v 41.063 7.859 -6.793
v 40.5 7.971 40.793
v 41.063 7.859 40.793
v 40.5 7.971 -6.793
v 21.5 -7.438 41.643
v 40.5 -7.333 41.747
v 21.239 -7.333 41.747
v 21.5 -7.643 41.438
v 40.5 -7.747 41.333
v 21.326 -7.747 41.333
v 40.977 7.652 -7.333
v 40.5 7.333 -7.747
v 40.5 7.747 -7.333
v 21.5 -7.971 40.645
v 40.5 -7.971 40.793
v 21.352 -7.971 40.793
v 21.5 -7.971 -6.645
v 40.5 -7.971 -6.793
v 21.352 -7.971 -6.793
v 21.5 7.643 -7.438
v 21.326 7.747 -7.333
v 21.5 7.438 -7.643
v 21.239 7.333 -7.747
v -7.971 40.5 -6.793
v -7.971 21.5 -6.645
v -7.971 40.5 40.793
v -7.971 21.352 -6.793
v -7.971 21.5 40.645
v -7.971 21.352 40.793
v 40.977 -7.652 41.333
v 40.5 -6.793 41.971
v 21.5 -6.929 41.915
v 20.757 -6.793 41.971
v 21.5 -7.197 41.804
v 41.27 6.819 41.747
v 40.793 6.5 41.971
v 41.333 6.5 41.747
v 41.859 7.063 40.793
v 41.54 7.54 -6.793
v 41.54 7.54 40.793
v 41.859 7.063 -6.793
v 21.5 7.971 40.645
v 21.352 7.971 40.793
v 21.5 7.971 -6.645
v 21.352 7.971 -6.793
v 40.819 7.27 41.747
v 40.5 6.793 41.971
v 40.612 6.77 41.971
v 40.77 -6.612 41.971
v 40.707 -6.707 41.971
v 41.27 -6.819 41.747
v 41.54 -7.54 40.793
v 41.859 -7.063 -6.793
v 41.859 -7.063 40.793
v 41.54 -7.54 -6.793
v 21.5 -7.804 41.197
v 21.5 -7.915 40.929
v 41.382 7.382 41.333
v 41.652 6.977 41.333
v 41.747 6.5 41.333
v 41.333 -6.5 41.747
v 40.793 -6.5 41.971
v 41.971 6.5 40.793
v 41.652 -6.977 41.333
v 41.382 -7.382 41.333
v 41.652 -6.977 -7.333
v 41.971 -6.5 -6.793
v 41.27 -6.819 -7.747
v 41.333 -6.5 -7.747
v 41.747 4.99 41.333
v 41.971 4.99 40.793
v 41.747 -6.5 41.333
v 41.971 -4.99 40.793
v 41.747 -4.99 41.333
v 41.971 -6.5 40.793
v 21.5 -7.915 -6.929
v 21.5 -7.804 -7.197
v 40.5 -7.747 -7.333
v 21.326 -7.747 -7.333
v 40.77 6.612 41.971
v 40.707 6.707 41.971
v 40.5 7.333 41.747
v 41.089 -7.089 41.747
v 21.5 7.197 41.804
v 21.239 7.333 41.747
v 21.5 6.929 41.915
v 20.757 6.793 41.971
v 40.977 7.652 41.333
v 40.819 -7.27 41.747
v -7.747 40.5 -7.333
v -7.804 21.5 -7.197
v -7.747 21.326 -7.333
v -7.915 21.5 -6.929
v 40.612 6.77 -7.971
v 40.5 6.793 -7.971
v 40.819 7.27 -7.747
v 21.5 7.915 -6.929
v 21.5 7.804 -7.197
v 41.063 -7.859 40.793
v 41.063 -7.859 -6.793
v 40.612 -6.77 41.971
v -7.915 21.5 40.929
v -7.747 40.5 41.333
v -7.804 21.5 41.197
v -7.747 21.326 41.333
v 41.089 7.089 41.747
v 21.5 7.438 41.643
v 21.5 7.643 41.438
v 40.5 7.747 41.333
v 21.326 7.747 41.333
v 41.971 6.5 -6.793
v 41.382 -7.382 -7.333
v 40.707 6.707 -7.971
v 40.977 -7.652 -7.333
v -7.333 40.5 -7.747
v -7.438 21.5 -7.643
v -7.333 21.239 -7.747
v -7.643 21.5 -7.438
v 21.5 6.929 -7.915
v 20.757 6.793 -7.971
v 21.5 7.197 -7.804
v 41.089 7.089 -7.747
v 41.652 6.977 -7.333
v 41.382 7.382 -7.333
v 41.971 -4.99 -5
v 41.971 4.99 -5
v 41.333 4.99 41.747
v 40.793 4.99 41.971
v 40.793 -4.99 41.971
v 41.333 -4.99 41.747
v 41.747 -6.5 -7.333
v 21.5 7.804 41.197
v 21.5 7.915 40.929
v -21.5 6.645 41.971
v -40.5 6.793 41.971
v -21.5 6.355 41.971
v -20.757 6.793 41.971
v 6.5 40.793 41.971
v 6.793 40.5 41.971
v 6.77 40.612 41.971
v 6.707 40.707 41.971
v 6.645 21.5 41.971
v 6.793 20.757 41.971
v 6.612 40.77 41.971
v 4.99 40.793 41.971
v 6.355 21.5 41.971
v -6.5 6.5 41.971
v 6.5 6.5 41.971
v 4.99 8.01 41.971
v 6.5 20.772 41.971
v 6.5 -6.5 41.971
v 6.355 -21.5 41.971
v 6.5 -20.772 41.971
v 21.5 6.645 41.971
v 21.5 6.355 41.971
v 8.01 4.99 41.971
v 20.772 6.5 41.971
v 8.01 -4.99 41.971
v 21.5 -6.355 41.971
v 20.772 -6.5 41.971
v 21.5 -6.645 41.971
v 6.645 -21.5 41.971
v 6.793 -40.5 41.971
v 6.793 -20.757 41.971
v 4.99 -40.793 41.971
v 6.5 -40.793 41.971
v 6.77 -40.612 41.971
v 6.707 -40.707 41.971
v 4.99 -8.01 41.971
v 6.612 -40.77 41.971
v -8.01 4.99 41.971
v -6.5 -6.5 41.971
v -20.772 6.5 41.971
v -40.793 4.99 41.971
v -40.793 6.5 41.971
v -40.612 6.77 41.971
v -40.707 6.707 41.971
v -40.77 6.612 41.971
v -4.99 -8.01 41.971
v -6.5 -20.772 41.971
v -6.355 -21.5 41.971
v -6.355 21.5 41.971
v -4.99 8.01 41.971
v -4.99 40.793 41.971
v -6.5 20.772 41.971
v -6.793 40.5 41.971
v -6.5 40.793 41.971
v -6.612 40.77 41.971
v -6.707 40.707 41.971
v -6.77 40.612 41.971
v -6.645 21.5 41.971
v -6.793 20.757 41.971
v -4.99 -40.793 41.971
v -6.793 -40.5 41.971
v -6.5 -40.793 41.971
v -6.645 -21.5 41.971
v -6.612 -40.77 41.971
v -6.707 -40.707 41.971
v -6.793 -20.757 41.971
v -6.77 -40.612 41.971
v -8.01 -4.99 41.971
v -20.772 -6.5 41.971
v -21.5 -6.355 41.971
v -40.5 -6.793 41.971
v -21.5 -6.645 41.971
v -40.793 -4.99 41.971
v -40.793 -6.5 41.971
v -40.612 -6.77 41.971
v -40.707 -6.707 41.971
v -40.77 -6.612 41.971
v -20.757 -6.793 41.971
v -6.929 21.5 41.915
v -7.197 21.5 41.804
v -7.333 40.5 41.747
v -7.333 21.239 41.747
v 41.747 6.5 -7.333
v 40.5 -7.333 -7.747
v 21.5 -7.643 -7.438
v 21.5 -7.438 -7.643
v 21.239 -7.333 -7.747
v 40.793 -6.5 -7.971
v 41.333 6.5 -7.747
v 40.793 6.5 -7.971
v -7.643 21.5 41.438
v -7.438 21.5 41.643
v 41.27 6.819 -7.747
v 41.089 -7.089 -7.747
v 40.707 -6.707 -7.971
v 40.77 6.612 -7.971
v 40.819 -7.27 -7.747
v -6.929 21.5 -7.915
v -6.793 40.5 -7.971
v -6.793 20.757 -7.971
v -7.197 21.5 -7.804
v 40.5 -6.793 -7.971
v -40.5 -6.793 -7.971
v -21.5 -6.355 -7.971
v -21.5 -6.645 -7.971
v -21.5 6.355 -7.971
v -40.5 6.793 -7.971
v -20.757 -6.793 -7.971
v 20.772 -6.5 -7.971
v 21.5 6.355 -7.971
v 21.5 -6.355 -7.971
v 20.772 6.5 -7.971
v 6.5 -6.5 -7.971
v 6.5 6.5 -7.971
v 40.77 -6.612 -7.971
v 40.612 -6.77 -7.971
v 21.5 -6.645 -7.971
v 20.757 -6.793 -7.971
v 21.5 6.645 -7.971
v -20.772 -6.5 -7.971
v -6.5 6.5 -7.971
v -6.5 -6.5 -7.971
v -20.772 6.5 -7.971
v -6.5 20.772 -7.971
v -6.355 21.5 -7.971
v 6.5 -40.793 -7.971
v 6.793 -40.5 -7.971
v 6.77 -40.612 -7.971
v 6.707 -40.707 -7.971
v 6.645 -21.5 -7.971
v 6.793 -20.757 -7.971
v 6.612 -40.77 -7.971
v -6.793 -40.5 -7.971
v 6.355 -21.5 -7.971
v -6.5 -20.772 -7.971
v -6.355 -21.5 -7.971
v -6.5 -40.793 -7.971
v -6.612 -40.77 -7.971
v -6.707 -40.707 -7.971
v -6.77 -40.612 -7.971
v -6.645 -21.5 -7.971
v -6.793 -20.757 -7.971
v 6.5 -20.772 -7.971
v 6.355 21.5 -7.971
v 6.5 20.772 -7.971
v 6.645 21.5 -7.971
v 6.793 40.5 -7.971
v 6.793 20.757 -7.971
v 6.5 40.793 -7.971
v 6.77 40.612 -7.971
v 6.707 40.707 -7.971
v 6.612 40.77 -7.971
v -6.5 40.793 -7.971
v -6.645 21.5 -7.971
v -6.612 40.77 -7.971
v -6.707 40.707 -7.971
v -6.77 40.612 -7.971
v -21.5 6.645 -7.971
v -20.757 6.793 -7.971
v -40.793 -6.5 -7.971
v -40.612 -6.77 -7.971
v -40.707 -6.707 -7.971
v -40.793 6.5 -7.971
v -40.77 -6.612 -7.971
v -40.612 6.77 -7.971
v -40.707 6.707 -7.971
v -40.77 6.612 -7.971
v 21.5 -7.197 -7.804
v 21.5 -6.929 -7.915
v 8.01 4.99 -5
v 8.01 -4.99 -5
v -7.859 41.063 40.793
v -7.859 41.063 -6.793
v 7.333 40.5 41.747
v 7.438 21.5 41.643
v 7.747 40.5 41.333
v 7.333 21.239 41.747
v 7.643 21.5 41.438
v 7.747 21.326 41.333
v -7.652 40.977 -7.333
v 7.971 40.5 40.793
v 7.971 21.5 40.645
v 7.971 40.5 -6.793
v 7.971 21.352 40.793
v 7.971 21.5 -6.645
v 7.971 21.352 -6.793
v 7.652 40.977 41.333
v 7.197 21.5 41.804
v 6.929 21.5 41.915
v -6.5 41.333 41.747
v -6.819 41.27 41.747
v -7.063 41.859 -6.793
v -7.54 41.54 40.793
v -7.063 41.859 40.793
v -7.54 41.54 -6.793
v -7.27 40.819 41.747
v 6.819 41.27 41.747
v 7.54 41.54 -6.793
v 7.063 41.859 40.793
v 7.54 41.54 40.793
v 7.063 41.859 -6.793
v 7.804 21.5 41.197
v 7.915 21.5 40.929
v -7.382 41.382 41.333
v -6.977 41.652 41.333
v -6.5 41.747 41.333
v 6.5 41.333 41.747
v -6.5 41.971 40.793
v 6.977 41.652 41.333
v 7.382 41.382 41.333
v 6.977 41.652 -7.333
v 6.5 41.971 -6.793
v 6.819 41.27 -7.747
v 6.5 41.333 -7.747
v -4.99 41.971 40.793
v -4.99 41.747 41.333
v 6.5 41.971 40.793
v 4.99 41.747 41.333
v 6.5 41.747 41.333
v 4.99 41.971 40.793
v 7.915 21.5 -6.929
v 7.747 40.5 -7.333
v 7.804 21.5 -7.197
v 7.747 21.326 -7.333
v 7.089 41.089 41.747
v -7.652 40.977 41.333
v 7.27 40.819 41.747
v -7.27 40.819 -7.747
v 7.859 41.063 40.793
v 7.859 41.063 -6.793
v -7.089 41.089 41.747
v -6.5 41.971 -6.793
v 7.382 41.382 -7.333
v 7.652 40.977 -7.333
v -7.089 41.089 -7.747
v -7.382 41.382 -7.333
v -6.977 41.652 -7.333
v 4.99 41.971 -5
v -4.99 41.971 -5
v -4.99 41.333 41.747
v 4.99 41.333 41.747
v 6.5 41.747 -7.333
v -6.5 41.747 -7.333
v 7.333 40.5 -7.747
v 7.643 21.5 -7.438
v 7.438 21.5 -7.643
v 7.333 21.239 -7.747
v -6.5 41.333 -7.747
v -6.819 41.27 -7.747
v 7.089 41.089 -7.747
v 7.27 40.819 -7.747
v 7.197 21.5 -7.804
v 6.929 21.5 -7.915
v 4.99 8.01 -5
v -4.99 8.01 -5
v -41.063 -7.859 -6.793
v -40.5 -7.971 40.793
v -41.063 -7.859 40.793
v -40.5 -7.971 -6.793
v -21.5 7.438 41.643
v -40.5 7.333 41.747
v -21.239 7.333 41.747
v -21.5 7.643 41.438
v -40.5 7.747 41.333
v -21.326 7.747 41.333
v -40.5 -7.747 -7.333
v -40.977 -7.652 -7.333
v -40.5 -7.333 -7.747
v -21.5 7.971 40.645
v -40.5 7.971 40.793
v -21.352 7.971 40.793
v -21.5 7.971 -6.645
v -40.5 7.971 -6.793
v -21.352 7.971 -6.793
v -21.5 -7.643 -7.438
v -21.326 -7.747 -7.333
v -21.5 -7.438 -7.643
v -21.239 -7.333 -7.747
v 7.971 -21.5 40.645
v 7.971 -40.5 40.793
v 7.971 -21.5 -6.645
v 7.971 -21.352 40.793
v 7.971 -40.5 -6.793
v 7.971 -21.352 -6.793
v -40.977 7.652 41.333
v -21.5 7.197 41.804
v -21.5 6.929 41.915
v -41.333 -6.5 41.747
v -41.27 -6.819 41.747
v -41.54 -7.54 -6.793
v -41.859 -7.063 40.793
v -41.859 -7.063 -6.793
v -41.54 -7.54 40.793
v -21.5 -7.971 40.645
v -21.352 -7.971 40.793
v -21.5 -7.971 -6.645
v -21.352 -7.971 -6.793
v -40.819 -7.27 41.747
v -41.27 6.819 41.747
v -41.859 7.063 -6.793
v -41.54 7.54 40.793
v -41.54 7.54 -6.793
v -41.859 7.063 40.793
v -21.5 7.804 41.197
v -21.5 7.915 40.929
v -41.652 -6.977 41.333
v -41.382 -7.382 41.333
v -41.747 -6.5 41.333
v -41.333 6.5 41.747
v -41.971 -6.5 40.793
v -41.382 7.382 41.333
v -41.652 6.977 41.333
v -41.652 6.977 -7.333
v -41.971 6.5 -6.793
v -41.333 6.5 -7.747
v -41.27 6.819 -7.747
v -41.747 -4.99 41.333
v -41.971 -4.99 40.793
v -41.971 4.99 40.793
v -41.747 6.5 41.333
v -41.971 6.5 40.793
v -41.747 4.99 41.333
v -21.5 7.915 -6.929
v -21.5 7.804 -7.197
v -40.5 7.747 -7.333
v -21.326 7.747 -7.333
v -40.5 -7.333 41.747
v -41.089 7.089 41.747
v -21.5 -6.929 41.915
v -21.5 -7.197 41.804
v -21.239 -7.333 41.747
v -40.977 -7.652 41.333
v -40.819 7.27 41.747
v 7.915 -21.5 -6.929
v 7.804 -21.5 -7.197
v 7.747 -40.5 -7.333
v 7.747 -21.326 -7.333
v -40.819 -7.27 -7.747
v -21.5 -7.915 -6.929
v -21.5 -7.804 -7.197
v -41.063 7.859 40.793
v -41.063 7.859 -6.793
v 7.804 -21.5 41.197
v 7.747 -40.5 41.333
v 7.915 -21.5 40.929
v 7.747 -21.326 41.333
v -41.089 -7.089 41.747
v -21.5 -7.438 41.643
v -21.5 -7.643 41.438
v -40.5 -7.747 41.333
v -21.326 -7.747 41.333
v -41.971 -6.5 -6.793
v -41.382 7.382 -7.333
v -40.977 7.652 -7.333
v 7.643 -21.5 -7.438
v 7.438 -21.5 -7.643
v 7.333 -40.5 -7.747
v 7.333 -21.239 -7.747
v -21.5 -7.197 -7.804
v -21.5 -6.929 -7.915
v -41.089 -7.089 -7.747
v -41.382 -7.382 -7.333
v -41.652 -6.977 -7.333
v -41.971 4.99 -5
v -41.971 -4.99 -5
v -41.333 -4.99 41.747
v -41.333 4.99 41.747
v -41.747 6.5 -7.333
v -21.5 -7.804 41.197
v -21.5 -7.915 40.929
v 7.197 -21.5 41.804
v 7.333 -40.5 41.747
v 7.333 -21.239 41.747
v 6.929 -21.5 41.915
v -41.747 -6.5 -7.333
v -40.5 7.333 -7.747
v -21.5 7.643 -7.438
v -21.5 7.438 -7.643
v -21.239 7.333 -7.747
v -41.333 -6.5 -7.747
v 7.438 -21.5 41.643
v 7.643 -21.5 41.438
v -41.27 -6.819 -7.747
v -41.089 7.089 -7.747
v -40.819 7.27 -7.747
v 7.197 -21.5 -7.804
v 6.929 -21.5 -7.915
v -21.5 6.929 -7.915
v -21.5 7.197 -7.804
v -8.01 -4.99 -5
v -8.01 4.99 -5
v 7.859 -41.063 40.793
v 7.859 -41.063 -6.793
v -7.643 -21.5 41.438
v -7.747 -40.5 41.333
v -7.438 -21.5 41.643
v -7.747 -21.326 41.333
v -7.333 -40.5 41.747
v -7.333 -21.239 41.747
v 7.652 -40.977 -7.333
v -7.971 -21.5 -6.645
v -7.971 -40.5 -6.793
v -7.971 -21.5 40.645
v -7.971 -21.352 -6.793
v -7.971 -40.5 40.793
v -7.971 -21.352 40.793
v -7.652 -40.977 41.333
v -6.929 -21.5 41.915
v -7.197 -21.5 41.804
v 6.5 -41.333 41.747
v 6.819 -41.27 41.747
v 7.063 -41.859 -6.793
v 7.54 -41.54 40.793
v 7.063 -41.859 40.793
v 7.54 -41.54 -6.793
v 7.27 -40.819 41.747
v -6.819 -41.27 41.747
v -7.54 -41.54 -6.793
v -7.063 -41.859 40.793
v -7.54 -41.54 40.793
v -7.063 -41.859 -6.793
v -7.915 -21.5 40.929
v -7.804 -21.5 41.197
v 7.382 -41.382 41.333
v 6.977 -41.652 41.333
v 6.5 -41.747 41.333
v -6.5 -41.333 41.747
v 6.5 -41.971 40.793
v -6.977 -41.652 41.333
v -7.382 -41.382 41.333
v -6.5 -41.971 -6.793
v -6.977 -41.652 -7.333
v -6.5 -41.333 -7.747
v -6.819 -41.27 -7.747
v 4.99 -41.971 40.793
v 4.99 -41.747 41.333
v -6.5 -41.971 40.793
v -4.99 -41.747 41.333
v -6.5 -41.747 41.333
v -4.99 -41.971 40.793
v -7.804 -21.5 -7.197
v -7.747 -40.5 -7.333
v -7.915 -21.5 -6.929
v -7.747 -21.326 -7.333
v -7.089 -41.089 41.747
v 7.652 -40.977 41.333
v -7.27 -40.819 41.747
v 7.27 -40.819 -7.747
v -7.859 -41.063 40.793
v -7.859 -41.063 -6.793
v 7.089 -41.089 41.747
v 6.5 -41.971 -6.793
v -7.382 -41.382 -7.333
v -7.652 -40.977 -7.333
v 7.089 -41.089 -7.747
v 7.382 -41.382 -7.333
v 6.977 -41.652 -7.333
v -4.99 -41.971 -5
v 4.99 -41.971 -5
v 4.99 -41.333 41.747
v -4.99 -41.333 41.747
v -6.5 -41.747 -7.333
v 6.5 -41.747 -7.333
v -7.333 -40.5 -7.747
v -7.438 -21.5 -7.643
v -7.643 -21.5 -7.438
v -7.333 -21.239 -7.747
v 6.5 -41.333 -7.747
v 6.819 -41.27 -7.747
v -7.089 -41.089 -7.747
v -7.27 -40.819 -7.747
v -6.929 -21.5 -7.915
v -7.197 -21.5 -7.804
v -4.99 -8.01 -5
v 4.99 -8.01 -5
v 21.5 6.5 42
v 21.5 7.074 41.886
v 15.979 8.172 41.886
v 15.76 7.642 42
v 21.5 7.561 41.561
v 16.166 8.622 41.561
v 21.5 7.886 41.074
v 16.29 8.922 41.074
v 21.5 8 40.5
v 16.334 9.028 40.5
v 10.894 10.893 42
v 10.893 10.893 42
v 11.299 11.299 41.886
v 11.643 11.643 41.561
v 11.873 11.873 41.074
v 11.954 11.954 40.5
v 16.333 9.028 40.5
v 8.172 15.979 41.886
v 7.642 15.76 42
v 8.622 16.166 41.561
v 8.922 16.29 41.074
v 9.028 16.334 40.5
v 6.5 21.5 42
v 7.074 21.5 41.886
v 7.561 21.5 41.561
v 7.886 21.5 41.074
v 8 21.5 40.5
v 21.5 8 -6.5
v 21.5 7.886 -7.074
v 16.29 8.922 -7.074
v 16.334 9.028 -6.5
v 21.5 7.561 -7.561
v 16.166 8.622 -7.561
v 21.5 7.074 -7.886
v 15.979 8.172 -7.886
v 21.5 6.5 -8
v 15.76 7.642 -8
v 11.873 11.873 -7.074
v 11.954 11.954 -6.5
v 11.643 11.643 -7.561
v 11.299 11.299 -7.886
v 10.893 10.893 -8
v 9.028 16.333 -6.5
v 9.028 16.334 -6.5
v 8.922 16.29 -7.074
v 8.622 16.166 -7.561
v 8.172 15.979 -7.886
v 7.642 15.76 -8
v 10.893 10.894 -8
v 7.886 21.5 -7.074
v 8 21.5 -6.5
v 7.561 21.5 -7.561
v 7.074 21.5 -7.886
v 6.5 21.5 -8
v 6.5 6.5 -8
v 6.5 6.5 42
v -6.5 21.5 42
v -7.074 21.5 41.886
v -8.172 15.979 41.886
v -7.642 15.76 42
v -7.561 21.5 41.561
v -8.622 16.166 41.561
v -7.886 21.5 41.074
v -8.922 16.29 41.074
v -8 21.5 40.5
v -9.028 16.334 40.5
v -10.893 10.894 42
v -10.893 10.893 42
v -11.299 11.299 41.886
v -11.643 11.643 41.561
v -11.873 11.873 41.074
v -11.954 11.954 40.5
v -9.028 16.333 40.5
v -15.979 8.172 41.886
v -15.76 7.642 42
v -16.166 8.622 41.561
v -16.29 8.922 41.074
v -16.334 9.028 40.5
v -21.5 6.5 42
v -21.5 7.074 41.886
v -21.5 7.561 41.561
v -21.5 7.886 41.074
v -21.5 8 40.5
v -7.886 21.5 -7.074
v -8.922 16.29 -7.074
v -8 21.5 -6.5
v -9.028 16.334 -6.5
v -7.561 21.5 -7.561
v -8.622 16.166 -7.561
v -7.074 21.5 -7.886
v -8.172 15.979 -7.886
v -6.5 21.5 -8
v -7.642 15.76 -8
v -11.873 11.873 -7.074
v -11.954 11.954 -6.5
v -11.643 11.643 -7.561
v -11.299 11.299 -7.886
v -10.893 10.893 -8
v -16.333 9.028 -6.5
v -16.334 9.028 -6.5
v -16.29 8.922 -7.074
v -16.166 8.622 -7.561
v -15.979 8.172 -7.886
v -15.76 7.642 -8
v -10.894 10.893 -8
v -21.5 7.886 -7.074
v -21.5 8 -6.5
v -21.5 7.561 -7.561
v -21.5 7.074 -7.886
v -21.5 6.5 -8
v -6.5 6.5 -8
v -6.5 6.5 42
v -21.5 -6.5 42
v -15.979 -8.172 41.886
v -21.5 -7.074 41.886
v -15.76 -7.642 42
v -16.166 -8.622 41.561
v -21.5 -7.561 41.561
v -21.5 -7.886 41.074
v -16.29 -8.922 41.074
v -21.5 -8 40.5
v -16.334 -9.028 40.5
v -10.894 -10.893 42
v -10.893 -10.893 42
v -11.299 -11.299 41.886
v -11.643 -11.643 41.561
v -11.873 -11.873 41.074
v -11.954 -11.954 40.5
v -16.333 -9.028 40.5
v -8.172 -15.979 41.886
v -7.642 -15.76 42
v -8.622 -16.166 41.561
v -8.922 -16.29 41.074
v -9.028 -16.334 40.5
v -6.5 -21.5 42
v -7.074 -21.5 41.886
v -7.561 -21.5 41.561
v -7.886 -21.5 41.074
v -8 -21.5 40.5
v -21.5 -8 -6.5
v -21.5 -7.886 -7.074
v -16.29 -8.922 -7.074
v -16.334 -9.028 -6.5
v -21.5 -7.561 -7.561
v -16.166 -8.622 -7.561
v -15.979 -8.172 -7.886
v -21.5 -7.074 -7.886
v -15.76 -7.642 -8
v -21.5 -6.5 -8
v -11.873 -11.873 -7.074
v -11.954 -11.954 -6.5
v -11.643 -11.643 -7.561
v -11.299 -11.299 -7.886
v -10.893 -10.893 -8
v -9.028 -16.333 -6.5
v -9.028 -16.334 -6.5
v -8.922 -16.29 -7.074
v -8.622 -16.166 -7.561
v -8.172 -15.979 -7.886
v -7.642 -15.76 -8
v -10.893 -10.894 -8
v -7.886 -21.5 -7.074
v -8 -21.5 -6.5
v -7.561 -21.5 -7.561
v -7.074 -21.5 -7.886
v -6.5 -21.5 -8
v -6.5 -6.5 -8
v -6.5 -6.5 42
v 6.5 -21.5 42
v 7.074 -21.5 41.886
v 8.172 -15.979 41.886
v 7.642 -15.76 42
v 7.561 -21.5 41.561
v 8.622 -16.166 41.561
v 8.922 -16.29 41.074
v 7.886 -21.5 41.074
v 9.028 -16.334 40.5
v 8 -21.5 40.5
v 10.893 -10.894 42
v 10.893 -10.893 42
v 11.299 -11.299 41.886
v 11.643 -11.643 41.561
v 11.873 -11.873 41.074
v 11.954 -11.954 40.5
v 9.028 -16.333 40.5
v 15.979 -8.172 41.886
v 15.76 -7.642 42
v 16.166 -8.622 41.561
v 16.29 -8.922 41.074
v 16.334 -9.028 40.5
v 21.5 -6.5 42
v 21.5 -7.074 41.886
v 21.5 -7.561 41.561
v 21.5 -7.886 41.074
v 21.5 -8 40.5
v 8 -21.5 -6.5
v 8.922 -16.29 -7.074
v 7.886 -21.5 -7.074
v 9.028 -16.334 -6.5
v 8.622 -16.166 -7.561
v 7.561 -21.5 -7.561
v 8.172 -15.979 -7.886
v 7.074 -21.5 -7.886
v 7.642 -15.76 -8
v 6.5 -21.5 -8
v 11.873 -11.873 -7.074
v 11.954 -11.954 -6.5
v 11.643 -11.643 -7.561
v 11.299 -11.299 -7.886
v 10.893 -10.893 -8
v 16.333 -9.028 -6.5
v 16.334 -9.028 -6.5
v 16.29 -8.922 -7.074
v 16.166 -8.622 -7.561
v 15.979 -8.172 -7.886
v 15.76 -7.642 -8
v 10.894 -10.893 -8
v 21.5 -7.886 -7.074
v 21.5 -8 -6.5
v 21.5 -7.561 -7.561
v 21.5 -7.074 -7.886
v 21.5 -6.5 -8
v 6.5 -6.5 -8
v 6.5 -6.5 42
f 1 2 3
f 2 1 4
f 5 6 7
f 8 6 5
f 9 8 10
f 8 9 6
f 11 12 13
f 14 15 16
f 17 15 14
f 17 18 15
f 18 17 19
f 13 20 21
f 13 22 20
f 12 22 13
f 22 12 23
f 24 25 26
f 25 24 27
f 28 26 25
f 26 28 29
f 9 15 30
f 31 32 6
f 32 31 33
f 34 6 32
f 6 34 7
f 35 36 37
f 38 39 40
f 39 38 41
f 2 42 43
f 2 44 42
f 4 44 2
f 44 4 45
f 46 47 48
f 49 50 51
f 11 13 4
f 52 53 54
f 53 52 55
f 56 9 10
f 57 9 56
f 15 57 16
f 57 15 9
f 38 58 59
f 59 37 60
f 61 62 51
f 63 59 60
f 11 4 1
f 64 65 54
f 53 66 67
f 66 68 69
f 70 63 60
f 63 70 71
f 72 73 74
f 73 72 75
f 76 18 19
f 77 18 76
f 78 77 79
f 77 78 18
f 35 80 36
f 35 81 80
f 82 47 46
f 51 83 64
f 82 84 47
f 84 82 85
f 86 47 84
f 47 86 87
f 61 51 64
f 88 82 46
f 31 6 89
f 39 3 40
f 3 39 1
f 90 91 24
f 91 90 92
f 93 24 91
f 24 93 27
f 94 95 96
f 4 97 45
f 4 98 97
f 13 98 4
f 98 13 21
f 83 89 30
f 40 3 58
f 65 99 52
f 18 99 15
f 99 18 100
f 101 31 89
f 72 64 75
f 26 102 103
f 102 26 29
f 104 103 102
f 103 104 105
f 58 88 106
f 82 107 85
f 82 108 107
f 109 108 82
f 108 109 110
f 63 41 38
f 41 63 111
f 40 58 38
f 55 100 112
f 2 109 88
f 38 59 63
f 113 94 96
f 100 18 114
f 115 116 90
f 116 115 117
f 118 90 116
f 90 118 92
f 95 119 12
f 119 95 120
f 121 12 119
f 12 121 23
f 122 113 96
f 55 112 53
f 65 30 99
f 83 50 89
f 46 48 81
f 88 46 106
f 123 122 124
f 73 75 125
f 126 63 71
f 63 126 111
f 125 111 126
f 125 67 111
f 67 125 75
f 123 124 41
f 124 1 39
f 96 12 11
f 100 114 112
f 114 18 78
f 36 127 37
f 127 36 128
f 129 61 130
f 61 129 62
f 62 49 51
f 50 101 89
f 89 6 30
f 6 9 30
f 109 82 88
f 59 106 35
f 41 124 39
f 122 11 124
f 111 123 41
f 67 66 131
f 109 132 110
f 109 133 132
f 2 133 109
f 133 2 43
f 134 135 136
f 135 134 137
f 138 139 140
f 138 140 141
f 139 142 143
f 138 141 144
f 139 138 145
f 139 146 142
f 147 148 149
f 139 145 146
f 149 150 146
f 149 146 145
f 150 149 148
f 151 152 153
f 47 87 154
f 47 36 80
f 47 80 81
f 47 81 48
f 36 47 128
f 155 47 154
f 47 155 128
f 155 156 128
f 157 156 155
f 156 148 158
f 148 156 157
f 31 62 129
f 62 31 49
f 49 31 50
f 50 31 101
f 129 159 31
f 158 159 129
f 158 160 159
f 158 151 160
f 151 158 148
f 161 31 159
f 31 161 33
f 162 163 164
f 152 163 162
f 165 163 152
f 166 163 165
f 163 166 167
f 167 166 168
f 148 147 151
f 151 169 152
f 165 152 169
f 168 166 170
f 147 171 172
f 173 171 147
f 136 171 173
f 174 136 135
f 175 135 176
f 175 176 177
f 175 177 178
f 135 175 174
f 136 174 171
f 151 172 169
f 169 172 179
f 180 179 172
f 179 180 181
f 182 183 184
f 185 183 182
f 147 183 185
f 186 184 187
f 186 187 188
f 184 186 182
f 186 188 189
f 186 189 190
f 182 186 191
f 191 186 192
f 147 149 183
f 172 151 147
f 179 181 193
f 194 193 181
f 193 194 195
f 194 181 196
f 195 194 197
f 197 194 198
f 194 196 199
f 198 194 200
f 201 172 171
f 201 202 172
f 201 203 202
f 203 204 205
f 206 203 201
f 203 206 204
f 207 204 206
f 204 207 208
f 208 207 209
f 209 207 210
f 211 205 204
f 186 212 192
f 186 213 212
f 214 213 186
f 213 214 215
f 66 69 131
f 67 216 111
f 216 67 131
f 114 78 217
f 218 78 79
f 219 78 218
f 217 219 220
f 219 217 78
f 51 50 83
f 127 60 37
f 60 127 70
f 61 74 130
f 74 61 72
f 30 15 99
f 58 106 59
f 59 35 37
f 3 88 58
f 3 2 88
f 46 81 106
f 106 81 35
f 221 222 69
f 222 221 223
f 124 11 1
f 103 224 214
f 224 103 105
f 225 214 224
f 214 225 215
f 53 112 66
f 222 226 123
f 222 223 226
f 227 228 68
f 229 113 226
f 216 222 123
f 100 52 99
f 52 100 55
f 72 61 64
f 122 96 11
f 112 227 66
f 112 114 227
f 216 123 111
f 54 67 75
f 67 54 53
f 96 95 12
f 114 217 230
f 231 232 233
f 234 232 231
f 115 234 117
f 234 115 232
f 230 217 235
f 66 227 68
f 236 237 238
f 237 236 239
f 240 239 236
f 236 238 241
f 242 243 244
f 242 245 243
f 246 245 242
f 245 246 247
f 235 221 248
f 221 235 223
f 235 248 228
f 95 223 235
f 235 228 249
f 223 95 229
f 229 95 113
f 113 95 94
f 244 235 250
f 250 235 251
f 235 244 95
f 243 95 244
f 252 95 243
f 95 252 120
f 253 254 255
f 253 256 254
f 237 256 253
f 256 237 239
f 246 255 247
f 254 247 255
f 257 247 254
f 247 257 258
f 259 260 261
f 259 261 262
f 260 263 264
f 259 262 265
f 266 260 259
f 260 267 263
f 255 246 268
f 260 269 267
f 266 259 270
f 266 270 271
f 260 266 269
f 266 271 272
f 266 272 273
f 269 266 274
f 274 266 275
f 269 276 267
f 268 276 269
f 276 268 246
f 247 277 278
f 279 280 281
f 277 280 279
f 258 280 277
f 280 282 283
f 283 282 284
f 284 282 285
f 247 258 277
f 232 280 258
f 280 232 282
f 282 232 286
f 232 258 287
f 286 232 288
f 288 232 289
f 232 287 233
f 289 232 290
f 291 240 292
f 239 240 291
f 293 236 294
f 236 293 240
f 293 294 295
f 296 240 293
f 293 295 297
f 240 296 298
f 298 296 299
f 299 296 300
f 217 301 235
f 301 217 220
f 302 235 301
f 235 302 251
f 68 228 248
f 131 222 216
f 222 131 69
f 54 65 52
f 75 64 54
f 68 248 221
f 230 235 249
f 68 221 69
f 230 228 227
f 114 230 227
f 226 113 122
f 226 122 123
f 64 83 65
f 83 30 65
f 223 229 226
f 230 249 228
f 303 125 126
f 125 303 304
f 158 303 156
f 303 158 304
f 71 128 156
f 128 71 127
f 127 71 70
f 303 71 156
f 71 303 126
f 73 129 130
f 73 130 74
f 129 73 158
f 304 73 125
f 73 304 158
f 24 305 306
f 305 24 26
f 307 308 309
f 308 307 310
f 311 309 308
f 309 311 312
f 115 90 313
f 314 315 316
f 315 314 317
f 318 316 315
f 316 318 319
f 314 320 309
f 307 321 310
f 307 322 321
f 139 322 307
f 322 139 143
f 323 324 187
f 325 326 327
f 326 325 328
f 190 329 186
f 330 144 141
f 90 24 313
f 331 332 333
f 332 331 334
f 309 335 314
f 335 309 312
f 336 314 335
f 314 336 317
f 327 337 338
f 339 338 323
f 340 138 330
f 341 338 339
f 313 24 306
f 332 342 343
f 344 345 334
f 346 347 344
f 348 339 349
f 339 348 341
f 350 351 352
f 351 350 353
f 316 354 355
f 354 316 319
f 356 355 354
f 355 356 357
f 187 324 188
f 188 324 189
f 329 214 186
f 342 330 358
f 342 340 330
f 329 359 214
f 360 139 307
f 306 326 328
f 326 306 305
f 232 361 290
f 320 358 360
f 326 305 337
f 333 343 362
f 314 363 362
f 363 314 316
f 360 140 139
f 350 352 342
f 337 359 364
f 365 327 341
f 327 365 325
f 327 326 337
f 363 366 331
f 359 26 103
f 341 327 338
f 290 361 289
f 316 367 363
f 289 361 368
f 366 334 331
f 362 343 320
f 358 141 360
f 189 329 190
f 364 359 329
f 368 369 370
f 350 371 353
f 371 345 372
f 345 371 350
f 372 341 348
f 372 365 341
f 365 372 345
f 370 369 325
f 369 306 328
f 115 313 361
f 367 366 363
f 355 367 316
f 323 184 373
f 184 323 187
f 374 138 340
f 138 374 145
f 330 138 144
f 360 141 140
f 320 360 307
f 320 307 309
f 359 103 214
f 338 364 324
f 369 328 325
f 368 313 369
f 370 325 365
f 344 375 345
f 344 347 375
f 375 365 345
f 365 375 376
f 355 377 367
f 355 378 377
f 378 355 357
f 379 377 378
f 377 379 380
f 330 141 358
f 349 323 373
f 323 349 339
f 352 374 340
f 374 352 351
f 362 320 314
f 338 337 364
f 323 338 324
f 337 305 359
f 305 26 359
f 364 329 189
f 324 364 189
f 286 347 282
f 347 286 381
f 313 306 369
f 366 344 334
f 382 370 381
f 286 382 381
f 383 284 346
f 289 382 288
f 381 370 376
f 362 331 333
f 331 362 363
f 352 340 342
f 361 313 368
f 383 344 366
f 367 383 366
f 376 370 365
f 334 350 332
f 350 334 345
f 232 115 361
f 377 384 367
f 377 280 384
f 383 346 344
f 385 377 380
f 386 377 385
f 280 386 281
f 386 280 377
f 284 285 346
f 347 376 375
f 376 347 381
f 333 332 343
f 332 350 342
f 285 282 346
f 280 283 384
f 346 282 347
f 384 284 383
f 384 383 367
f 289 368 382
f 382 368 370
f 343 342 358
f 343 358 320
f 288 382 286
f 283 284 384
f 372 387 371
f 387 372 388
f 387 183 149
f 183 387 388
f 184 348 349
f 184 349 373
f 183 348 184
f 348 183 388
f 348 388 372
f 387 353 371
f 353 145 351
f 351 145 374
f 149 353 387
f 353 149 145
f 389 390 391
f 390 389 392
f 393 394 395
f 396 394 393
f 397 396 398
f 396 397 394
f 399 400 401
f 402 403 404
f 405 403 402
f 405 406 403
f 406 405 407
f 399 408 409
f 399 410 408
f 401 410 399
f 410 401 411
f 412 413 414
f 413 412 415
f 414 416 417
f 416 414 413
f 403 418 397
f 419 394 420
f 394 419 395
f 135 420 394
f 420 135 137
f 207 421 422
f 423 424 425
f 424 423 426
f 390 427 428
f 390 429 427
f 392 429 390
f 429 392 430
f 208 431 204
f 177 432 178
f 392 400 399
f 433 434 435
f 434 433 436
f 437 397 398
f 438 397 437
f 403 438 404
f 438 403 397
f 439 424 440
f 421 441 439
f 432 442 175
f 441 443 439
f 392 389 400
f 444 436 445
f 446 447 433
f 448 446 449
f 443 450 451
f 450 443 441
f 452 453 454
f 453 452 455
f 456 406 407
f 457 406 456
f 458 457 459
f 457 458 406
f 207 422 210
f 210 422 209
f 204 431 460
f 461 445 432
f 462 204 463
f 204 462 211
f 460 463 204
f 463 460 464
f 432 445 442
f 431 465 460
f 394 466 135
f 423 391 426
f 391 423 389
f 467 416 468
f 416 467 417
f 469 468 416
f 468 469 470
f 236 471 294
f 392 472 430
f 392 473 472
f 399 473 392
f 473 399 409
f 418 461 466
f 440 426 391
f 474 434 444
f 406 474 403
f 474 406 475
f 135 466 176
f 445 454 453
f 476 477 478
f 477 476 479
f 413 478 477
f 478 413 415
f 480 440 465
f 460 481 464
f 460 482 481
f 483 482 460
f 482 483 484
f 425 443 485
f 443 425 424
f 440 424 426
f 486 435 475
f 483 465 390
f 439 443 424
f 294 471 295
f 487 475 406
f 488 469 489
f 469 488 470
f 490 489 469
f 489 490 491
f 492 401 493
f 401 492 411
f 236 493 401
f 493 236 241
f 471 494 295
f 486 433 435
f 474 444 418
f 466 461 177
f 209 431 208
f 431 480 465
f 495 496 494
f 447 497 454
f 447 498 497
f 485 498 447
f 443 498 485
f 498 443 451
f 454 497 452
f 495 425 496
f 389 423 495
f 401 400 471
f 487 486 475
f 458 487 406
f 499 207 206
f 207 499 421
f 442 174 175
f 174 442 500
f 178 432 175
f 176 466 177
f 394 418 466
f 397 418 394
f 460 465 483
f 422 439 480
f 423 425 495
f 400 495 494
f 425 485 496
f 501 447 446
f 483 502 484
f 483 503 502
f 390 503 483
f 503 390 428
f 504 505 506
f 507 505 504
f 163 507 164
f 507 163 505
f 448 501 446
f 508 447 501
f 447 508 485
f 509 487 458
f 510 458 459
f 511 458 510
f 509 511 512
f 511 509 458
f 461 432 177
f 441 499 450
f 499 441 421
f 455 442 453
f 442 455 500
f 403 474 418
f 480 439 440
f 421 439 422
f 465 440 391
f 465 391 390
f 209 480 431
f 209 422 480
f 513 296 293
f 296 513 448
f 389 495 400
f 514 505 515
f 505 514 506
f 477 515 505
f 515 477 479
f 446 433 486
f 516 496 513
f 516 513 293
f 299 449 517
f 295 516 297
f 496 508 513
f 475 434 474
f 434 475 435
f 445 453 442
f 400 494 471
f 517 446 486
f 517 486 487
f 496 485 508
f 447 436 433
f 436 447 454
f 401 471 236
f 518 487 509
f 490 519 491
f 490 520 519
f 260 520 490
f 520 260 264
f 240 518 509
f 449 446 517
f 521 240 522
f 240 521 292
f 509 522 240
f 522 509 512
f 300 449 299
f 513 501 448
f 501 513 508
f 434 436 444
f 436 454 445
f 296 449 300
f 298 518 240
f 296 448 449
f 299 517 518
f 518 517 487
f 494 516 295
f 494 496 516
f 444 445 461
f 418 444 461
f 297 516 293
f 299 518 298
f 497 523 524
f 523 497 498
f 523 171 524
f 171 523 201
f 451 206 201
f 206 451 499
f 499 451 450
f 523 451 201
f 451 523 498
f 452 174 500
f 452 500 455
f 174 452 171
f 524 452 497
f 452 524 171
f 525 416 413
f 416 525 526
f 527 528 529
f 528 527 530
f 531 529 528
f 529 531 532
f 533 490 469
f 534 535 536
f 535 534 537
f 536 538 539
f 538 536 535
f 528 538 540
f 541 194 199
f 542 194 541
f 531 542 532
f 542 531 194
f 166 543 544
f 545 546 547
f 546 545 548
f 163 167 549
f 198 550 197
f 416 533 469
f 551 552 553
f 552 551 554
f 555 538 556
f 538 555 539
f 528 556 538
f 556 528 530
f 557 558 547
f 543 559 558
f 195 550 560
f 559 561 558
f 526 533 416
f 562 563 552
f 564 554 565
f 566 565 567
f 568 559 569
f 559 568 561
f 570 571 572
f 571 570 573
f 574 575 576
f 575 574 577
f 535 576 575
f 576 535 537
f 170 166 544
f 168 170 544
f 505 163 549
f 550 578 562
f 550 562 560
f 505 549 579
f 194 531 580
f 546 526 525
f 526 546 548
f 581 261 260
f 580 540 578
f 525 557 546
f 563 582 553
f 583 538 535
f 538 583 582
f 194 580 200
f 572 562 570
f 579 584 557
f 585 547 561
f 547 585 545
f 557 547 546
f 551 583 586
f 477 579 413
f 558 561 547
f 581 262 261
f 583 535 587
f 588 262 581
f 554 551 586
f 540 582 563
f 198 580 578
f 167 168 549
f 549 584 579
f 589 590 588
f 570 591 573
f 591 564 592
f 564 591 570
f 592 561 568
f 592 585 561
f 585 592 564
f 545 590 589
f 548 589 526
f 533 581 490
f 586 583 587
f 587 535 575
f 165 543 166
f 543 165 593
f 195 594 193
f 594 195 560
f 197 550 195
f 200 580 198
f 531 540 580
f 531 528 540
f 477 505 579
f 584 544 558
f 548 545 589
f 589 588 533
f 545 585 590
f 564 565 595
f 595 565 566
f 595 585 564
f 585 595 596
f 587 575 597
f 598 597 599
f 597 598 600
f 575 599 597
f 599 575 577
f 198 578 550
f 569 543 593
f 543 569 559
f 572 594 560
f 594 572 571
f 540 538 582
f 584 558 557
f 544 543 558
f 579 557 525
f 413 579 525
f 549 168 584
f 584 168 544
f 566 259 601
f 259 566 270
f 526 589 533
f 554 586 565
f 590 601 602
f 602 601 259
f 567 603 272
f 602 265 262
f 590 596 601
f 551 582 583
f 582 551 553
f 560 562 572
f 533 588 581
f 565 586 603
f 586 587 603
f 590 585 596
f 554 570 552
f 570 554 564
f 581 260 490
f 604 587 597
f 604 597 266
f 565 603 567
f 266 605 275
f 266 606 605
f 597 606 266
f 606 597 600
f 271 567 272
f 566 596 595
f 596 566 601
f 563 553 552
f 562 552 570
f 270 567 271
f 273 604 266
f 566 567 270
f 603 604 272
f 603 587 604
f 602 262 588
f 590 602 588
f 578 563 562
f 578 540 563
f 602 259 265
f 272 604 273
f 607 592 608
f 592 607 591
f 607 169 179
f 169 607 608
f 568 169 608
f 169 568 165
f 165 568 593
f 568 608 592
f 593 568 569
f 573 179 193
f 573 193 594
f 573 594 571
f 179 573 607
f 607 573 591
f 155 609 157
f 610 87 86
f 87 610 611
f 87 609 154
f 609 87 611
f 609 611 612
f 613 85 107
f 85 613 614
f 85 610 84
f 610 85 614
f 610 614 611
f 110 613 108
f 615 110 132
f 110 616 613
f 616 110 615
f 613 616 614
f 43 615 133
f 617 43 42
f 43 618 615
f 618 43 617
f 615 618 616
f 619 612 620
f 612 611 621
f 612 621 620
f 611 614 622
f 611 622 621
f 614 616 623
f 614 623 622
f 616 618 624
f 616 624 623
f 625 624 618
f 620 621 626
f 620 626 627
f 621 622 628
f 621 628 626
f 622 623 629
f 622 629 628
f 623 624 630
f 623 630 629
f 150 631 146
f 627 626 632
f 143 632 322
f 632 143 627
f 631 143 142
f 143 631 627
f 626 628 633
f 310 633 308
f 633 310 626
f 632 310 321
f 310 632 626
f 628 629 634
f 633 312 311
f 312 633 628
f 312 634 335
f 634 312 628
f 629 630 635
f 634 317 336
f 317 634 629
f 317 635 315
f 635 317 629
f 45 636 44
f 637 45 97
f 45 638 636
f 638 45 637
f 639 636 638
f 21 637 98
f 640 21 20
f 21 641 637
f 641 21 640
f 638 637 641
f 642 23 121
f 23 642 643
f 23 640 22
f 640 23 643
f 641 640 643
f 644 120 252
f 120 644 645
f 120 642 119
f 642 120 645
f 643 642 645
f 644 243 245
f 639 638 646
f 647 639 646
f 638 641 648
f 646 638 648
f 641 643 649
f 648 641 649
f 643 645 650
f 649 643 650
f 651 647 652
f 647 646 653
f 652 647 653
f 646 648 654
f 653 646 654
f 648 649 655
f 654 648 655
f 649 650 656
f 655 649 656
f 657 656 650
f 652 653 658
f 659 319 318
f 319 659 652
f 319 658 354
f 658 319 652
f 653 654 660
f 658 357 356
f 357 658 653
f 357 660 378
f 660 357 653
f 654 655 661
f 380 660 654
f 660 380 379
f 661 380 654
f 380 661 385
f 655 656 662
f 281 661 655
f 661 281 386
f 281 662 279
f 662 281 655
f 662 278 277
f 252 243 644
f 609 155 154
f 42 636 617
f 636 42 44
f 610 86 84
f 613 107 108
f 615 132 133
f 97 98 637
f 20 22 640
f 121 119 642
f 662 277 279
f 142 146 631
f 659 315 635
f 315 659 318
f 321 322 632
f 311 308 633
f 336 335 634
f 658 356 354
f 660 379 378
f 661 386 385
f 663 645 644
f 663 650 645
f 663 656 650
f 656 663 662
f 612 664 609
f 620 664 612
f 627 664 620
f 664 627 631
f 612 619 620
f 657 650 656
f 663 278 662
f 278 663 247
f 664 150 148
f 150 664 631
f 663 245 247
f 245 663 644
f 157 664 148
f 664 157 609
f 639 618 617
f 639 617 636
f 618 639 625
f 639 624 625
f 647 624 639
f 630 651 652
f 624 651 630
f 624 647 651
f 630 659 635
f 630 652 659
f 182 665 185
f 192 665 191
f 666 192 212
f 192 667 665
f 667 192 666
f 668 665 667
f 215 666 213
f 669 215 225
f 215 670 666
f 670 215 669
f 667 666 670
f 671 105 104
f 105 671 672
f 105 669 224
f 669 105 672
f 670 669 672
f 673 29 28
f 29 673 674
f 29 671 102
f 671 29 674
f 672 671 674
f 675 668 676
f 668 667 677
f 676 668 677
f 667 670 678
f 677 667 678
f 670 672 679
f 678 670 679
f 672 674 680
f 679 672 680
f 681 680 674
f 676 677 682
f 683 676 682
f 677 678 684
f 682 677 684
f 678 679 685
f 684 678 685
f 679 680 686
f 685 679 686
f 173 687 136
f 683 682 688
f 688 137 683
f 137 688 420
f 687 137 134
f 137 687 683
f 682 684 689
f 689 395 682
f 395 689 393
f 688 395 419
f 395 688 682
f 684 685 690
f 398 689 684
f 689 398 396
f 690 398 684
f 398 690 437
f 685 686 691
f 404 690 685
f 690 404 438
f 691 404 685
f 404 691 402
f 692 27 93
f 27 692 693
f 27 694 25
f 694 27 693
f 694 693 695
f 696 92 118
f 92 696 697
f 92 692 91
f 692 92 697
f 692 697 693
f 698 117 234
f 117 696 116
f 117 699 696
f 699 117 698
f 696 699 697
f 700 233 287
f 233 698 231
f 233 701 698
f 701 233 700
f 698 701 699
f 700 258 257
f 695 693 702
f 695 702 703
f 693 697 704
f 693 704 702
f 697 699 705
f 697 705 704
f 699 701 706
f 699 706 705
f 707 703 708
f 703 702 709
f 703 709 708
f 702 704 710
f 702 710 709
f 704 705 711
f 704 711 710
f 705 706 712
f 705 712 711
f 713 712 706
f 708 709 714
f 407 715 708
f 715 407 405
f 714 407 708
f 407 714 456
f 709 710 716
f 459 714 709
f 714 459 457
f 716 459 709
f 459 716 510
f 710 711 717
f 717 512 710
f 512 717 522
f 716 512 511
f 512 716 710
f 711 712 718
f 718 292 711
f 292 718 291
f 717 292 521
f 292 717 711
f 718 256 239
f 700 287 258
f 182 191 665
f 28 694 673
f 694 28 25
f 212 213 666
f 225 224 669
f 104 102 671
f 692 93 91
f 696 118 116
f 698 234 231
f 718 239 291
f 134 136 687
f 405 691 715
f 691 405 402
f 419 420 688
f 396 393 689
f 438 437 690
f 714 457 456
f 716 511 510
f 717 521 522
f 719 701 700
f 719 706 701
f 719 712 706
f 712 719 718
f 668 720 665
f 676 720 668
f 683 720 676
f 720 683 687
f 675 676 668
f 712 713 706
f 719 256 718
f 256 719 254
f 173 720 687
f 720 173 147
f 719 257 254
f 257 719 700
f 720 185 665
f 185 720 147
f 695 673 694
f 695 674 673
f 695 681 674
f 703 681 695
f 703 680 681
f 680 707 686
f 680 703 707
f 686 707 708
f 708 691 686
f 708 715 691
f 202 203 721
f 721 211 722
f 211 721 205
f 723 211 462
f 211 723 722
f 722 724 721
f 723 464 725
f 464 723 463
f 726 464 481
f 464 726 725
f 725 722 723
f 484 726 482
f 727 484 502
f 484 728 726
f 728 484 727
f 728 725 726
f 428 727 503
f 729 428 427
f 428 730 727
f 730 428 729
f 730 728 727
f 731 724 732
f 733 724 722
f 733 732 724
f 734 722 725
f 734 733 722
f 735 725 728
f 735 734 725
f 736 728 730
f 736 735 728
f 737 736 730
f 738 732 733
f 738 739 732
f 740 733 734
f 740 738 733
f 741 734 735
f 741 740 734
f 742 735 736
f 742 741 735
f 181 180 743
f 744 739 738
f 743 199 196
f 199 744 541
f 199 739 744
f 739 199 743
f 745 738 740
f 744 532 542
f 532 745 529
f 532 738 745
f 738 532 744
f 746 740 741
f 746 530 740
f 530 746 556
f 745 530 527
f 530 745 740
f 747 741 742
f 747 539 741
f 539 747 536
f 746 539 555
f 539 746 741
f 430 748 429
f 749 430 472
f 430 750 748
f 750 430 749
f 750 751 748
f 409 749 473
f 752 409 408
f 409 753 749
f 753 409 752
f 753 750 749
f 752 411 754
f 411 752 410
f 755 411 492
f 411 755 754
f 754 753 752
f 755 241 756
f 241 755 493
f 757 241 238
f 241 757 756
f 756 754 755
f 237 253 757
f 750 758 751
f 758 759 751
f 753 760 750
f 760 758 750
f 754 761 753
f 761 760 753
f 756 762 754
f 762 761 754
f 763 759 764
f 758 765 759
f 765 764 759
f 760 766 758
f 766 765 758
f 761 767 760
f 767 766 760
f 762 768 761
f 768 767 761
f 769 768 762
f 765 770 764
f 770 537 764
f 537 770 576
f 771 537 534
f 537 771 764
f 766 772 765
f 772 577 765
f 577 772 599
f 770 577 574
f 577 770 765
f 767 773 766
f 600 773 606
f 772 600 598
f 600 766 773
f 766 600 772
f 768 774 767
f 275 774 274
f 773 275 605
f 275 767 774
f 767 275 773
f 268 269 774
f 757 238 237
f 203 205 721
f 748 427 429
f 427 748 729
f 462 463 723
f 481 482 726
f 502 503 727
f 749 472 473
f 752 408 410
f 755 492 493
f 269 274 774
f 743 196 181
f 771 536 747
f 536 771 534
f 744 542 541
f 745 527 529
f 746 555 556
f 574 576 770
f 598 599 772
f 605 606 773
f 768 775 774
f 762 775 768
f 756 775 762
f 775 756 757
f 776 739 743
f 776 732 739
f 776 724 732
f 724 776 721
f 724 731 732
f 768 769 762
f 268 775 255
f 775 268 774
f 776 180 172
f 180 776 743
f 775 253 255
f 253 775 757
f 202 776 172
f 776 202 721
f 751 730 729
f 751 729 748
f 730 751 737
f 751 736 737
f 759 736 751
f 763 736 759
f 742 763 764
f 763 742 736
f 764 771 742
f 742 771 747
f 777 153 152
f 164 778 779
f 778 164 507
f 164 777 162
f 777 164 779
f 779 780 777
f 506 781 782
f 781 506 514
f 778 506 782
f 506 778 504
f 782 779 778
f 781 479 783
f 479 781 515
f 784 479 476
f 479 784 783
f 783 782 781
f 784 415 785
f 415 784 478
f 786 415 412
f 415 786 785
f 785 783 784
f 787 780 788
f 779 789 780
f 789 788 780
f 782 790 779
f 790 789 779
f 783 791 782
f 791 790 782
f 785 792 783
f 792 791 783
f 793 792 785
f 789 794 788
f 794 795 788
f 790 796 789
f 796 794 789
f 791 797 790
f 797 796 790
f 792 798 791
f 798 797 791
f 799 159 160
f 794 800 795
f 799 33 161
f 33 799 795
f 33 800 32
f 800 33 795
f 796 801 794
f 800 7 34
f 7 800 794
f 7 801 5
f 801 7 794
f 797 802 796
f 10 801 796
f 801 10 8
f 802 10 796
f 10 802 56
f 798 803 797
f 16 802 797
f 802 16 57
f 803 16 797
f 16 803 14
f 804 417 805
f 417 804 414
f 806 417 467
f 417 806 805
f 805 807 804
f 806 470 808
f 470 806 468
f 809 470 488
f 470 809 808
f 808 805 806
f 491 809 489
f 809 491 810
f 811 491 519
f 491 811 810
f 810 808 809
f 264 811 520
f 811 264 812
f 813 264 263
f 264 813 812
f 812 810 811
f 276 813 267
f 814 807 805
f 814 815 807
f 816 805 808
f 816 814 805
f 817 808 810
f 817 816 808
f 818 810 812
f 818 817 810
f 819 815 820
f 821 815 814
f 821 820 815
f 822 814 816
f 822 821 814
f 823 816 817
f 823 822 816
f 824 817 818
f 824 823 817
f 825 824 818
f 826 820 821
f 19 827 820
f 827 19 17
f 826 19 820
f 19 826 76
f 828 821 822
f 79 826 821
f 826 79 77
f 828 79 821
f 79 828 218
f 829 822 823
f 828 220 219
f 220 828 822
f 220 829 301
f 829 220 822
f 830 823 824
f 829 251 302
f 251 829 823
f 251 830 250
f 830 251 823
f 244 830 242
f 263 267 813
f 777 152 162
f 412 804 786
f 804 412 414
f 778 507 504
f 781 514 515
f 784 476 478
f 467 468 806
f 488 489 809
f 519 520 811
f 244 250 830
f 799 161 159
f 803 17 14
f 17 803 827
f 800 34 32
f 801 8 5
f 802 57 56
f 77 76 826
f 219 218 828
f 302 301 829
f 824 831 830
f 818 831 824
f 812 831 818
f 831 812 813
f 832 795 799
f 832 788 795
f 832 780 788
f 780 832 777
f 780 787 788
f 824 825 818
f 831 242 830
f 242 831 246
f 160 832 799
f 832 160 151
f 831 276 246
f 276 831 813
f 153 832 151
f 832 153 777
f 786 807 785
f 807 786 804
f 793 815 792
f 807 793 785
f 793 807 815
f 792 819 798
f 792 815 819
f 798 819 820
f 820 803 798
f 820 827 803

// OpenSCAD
/* [Parameters] */

//
module_type = "X-module"; // [I-module, L-module, T-module, X-module, BL-module, BT-module, BR-module, FL-module, FT-module, FR-module]

//
module_width = 50;

//
board_thickness = 10;

//
wall_thickness = 3;

/* [Shape] */
//Open SCAD parameter $fn = 4*detalization. Do not put too big value customizer will stuck.
shape_detalization=4; // default = 15, i.e. $fn = 60

//
corner_radius = 15;

//corner shape type
shape_type = "no shape"; // [no shape, linear, circle, arc-in]

//
shape_parameter = 0;

HH = module_width;
RR = corner_radius;
DD = board_thickness;
r=wall_thickness/2;

PP = shape_parameter;
$fn = 4*shape_detalization;

module side_block(h,d,r) {
 LHH = h-d/2-3*r;
 LDD = d/2+r;
 eps=0.01;

 difference(){
  hull(){
   translate([-LDD,+LDD,-LDD])sphere(r=r,center=true);
   translate([-LDD,-LDD,-LDD])sphere(r=r,center=true);
   translate([LHH,+LDD,-LDD])sphere(r=r,center=true);
   translate([LHH,-LDD,-LDD])sphere(r=r,center=true);
   translate([-LDD,+LDD,LHH])sphere(r=r,center=true);
   translate([-LDD,-LDD,LHH])sphere(r=r,center=true);
   translate([LHH,+LDD,LHH])sphere(r=r,center=true);
   translate([LHH,-LDD,LHH])sphere(r=r,center=true);
  }
  translate([d/2+2*r+eps,-d/2+eps,-d/2])cube([h,d-2*eps,h]);
 }
}

module side_corner(h,d,q,r) {
 LHH = h-d/2-3*r;
 LDD = d/2+r;
 w=d+2*r;

 translate([0,0,-(d/2+r)]){
  translate([q+w/2,q+w/2,0])
  intersection(){
   rotate_extrude(convexity = 2){
    translate([q, 0]) circle(r = r); 
    translate([q, HH-2*r]) circle(r = r); 
   }
   translate([-q/2-r/2,-q/2-r/2,HH/2-r])
    cube([q+r,q+r,HH],center=true);
  }

  translate([0,0,-r])
  linear_extrude(HH)
  difference(){
   translate([w/2,w/2])square([q,q]);
   translate([+(q+w/2),+(q+w/2)])circle(q);
  }

  linear_extrude(HH-2*r)
  difference(){
   translate([w/2,w/2])square([q,q]);
   translate([+(q+w/2),+(q+w/2)])circle(q-r);
  }
 }
}

module side_plate_line(h,d,q,r){
 LHH = h-d/2-3*r;
 LDD = d/2+r;

 hull()
 {
  translate([LDD,LDD,-LDD])sphere(r=r,center=true);
  translate([LDD,LHH-q,-LDD])sphere(r=r,center=true);
  translate([LHH-q,LDD,-LDD])sphere(r=r,center=true);
 }
}

module side_plate_arcout(h,d,q,r){
 LHH = h-d/2-3*r;
 LDD = d/2+r;

 hull()
 {
  translate([LDD,LDD,-LDD])sphere(r=r,center=true);
  translate([LDD,LHH,-LDD])sphere(r=r,center=true);
  translate([LHH,LDD,-LDD])sphere(r=r,center=true);
  translate([0,0,-(d/2+r)])
  translate([LHH-q,LHH-q,0])
  intersection(){
   rotate_extrude(){
    translate([q, 0])
    intersection(){
     circle(r = r);
     translate([0,-r])square([2*r,2*r]);
    }
   }
   translate([+q/2+r/2,+q/2+r/2,h/2-r])
    cube([q+r,q+r,h],center=true);
  }
 }
}

module side_plate_arcin(h,d,q,r) {
 LHH = h-d/2-3*r;
 LDD = d/2+r;
 w=d+2*r;

 translate([0,0,-(d/2+r)]){
  translate([q+w/2,q+w/2,0])
  intersection(){
   rotate_extrude(convexity = 2){
    translate([q, 0]) circle(r = r); 
   }
   translate([-q/2-r/2,-q/2-r/2,HH/2-r])
    cube([q+r,q+r,HH],center=true);
  }

  translate([0,0,-r])
  linear_extrude(2*r)
  difference(){
   translate([w/2,w/2])square([q,q]);
   translate([+(q+w/2),+(q+w/2)])circle(q);
  }
 }
}

module side_plate(h,d,q,r){
 side_corner(h,d,q,r);
 if (shape_type == "linear") side_plate_line(h,d,PP,r);
 if (shape_type == "circle") side_plate_arcout(h,d,PP,r);
 if (shape_type == "arc-in") side_plate_arcin(h,d,h-d-4*r-PP,r);
}

module bottom_sub(h,d,q,r){
 w=d+2*r;
 translate([+(h-w/2),-w/2,0])
 scale([0.8,h/(h-w),1])  //1.5
 translate([0,h-w,0])
 cylinder(r=h-w,h=2*h,center=true,$fn=2*$fn);
}

module bottom_frame(h,d,q,r){
 LHH = h-d/2-3*r;
 LDD = d/2+r;
 w=d+2*r;
 ww = 2*h-w-2*(h-w)*0.8;

 rotate([0,0,180])
 minkowski()
 {
  difference(){
   translate([0,d/2+r,0])
    translate([-ww/2,0,-ww/2])
    cube([h-2*r,LHH-d/2-r,h-2*r]);
 
   union(){
    rotate([0,  0,0]) bottom_sub(h,d,q,r);
    rotate([0, 90,0]) bottom_sub(h,d,q,r);
    rotate([0,-90,0]) bottom_sub(h,d,q,r);
    rotate([0,180,0]) bottom_sub(h,d,q,r);
   }
  }
  sphere(r=r);
 }
}

module module_BL(h=HH,d=DD,q=RR,r=r){
 w=d+2*r;
 ww = 2*h-w-2*(h-w)*0.8;
 
 module_L(h,d,q,r);
 translate([(ww-w)/2,0,(ww-w)/2])
 rotate([0,90,0])bottom_frame(h,d,q,r);
}

module module_BR(h=HH,d=DD,q=RR,r=r){
 mirror([1,0,0])module_BL(h,d,q,r);
}

module module_BT(h=HH,d=DD,q=RR,r=r){
 w=d+2*r;
 ww = 2*h-w-2*(h-w)*0.8;
 
 rotate([0,0,180])module_T(h,d,q,r);
 translate([0,0,(ww-w)/2]){
 rotate([0,0,0])bottom_frame(h,d,q,r);
 rotate([0,90,0])bottom_frame(h,d,q,r);
 }
}

module module_FR(h=HH,d=DD,q=RR,r=r){
 w=d+2*r;
 ww = 2*h-w-2*(h-w)*0.8;
 
 module_L(h,d,q,r);
 //translate([(ww-w)/2,0,(ww-w)/2])
 translate([(ww-w)/2,0,h-w-2*r-(ww-w)/2])
 rotate([0,180,0])bottom_frame(h,d,q,r);
}

module module_FL(h=HH,d=DD,q=RR,r=r){
 mirror([1,0,0])module_FR(h,d,q,r);
}

module module_FT(h=HH,d=DD,q=RR,r=r){
 w=d+2*r;
 ww = 2*h-w-2*(h-w)*0.8;
 
 rotate([0,0,180])module_T(h,d,q,r);
 translate([0,0,h-w-2*r-(ww-w)/2]){
 rotate([0,180,0])bottom_frame(h,d,q,r);
 rotate([0,-90,0])bottom_frame(h,d,q,r);
 }
}

module module_I(h=HH,d=DD,q=RR,r=r){
 rotate([0,0,-90])side_block(h, d, r);
 rotate([0,0,+90])side_block(h, d, r);
}

module module_L(h=HH,d=DD,q=RR,r=r){
 side_block(h, d, r);
 rotate([0,0,90])side_block(h, d, r);

 side_plate(h,d,q,r);
}

module module_T(h=HH,d=DD,q=RR,r=r){
 rotate([0,0,0])side_block(h, d, r);
 rotate([0,0,-90])side_block(h, d, r);
 rotate([0,0,180])side_block(h, d, r);

 rotate([0,0,-90])side_plate(h,d,q,r);
 rotate([0,0,180])side_plate(h,d,q,r);
}

module module_X(h=HH,d=DD,q=RR,r=r){
 rotate([0,0,  0])side_block(h, d, r);
 rotate([0,0, 90])side_block(h, d, r);
 rotate([0,0,180])side_block(h, d, r);
 rotate([0,0,270])side_block(h, d, r);

 rotate([0,0,  0])side_plate(h,d,q,r);
 rotate([0,0, 90])side_plate(h,d,q,r);
 rotate([0,0,180])side_plate(h,d,q,r);
 rotate([0,0,270])side_plate(h,d,q,r);
}

if (module_type == "I-module") module_I();
if (module_type == "L-module") module_L();
if (module_type == "T-module") module_T();
if (module_type == "X-module") module_X();
if (module_type == "BL-module") module_BL();
if (module_type == "BT-module") module_BT();
if (module_type == "BR-module") module_BR();
if (module_type == "FL-module") module_FL();
if (module_type == "FT-module") module_FT();
if (module_type == "FR-module") module_FR();

